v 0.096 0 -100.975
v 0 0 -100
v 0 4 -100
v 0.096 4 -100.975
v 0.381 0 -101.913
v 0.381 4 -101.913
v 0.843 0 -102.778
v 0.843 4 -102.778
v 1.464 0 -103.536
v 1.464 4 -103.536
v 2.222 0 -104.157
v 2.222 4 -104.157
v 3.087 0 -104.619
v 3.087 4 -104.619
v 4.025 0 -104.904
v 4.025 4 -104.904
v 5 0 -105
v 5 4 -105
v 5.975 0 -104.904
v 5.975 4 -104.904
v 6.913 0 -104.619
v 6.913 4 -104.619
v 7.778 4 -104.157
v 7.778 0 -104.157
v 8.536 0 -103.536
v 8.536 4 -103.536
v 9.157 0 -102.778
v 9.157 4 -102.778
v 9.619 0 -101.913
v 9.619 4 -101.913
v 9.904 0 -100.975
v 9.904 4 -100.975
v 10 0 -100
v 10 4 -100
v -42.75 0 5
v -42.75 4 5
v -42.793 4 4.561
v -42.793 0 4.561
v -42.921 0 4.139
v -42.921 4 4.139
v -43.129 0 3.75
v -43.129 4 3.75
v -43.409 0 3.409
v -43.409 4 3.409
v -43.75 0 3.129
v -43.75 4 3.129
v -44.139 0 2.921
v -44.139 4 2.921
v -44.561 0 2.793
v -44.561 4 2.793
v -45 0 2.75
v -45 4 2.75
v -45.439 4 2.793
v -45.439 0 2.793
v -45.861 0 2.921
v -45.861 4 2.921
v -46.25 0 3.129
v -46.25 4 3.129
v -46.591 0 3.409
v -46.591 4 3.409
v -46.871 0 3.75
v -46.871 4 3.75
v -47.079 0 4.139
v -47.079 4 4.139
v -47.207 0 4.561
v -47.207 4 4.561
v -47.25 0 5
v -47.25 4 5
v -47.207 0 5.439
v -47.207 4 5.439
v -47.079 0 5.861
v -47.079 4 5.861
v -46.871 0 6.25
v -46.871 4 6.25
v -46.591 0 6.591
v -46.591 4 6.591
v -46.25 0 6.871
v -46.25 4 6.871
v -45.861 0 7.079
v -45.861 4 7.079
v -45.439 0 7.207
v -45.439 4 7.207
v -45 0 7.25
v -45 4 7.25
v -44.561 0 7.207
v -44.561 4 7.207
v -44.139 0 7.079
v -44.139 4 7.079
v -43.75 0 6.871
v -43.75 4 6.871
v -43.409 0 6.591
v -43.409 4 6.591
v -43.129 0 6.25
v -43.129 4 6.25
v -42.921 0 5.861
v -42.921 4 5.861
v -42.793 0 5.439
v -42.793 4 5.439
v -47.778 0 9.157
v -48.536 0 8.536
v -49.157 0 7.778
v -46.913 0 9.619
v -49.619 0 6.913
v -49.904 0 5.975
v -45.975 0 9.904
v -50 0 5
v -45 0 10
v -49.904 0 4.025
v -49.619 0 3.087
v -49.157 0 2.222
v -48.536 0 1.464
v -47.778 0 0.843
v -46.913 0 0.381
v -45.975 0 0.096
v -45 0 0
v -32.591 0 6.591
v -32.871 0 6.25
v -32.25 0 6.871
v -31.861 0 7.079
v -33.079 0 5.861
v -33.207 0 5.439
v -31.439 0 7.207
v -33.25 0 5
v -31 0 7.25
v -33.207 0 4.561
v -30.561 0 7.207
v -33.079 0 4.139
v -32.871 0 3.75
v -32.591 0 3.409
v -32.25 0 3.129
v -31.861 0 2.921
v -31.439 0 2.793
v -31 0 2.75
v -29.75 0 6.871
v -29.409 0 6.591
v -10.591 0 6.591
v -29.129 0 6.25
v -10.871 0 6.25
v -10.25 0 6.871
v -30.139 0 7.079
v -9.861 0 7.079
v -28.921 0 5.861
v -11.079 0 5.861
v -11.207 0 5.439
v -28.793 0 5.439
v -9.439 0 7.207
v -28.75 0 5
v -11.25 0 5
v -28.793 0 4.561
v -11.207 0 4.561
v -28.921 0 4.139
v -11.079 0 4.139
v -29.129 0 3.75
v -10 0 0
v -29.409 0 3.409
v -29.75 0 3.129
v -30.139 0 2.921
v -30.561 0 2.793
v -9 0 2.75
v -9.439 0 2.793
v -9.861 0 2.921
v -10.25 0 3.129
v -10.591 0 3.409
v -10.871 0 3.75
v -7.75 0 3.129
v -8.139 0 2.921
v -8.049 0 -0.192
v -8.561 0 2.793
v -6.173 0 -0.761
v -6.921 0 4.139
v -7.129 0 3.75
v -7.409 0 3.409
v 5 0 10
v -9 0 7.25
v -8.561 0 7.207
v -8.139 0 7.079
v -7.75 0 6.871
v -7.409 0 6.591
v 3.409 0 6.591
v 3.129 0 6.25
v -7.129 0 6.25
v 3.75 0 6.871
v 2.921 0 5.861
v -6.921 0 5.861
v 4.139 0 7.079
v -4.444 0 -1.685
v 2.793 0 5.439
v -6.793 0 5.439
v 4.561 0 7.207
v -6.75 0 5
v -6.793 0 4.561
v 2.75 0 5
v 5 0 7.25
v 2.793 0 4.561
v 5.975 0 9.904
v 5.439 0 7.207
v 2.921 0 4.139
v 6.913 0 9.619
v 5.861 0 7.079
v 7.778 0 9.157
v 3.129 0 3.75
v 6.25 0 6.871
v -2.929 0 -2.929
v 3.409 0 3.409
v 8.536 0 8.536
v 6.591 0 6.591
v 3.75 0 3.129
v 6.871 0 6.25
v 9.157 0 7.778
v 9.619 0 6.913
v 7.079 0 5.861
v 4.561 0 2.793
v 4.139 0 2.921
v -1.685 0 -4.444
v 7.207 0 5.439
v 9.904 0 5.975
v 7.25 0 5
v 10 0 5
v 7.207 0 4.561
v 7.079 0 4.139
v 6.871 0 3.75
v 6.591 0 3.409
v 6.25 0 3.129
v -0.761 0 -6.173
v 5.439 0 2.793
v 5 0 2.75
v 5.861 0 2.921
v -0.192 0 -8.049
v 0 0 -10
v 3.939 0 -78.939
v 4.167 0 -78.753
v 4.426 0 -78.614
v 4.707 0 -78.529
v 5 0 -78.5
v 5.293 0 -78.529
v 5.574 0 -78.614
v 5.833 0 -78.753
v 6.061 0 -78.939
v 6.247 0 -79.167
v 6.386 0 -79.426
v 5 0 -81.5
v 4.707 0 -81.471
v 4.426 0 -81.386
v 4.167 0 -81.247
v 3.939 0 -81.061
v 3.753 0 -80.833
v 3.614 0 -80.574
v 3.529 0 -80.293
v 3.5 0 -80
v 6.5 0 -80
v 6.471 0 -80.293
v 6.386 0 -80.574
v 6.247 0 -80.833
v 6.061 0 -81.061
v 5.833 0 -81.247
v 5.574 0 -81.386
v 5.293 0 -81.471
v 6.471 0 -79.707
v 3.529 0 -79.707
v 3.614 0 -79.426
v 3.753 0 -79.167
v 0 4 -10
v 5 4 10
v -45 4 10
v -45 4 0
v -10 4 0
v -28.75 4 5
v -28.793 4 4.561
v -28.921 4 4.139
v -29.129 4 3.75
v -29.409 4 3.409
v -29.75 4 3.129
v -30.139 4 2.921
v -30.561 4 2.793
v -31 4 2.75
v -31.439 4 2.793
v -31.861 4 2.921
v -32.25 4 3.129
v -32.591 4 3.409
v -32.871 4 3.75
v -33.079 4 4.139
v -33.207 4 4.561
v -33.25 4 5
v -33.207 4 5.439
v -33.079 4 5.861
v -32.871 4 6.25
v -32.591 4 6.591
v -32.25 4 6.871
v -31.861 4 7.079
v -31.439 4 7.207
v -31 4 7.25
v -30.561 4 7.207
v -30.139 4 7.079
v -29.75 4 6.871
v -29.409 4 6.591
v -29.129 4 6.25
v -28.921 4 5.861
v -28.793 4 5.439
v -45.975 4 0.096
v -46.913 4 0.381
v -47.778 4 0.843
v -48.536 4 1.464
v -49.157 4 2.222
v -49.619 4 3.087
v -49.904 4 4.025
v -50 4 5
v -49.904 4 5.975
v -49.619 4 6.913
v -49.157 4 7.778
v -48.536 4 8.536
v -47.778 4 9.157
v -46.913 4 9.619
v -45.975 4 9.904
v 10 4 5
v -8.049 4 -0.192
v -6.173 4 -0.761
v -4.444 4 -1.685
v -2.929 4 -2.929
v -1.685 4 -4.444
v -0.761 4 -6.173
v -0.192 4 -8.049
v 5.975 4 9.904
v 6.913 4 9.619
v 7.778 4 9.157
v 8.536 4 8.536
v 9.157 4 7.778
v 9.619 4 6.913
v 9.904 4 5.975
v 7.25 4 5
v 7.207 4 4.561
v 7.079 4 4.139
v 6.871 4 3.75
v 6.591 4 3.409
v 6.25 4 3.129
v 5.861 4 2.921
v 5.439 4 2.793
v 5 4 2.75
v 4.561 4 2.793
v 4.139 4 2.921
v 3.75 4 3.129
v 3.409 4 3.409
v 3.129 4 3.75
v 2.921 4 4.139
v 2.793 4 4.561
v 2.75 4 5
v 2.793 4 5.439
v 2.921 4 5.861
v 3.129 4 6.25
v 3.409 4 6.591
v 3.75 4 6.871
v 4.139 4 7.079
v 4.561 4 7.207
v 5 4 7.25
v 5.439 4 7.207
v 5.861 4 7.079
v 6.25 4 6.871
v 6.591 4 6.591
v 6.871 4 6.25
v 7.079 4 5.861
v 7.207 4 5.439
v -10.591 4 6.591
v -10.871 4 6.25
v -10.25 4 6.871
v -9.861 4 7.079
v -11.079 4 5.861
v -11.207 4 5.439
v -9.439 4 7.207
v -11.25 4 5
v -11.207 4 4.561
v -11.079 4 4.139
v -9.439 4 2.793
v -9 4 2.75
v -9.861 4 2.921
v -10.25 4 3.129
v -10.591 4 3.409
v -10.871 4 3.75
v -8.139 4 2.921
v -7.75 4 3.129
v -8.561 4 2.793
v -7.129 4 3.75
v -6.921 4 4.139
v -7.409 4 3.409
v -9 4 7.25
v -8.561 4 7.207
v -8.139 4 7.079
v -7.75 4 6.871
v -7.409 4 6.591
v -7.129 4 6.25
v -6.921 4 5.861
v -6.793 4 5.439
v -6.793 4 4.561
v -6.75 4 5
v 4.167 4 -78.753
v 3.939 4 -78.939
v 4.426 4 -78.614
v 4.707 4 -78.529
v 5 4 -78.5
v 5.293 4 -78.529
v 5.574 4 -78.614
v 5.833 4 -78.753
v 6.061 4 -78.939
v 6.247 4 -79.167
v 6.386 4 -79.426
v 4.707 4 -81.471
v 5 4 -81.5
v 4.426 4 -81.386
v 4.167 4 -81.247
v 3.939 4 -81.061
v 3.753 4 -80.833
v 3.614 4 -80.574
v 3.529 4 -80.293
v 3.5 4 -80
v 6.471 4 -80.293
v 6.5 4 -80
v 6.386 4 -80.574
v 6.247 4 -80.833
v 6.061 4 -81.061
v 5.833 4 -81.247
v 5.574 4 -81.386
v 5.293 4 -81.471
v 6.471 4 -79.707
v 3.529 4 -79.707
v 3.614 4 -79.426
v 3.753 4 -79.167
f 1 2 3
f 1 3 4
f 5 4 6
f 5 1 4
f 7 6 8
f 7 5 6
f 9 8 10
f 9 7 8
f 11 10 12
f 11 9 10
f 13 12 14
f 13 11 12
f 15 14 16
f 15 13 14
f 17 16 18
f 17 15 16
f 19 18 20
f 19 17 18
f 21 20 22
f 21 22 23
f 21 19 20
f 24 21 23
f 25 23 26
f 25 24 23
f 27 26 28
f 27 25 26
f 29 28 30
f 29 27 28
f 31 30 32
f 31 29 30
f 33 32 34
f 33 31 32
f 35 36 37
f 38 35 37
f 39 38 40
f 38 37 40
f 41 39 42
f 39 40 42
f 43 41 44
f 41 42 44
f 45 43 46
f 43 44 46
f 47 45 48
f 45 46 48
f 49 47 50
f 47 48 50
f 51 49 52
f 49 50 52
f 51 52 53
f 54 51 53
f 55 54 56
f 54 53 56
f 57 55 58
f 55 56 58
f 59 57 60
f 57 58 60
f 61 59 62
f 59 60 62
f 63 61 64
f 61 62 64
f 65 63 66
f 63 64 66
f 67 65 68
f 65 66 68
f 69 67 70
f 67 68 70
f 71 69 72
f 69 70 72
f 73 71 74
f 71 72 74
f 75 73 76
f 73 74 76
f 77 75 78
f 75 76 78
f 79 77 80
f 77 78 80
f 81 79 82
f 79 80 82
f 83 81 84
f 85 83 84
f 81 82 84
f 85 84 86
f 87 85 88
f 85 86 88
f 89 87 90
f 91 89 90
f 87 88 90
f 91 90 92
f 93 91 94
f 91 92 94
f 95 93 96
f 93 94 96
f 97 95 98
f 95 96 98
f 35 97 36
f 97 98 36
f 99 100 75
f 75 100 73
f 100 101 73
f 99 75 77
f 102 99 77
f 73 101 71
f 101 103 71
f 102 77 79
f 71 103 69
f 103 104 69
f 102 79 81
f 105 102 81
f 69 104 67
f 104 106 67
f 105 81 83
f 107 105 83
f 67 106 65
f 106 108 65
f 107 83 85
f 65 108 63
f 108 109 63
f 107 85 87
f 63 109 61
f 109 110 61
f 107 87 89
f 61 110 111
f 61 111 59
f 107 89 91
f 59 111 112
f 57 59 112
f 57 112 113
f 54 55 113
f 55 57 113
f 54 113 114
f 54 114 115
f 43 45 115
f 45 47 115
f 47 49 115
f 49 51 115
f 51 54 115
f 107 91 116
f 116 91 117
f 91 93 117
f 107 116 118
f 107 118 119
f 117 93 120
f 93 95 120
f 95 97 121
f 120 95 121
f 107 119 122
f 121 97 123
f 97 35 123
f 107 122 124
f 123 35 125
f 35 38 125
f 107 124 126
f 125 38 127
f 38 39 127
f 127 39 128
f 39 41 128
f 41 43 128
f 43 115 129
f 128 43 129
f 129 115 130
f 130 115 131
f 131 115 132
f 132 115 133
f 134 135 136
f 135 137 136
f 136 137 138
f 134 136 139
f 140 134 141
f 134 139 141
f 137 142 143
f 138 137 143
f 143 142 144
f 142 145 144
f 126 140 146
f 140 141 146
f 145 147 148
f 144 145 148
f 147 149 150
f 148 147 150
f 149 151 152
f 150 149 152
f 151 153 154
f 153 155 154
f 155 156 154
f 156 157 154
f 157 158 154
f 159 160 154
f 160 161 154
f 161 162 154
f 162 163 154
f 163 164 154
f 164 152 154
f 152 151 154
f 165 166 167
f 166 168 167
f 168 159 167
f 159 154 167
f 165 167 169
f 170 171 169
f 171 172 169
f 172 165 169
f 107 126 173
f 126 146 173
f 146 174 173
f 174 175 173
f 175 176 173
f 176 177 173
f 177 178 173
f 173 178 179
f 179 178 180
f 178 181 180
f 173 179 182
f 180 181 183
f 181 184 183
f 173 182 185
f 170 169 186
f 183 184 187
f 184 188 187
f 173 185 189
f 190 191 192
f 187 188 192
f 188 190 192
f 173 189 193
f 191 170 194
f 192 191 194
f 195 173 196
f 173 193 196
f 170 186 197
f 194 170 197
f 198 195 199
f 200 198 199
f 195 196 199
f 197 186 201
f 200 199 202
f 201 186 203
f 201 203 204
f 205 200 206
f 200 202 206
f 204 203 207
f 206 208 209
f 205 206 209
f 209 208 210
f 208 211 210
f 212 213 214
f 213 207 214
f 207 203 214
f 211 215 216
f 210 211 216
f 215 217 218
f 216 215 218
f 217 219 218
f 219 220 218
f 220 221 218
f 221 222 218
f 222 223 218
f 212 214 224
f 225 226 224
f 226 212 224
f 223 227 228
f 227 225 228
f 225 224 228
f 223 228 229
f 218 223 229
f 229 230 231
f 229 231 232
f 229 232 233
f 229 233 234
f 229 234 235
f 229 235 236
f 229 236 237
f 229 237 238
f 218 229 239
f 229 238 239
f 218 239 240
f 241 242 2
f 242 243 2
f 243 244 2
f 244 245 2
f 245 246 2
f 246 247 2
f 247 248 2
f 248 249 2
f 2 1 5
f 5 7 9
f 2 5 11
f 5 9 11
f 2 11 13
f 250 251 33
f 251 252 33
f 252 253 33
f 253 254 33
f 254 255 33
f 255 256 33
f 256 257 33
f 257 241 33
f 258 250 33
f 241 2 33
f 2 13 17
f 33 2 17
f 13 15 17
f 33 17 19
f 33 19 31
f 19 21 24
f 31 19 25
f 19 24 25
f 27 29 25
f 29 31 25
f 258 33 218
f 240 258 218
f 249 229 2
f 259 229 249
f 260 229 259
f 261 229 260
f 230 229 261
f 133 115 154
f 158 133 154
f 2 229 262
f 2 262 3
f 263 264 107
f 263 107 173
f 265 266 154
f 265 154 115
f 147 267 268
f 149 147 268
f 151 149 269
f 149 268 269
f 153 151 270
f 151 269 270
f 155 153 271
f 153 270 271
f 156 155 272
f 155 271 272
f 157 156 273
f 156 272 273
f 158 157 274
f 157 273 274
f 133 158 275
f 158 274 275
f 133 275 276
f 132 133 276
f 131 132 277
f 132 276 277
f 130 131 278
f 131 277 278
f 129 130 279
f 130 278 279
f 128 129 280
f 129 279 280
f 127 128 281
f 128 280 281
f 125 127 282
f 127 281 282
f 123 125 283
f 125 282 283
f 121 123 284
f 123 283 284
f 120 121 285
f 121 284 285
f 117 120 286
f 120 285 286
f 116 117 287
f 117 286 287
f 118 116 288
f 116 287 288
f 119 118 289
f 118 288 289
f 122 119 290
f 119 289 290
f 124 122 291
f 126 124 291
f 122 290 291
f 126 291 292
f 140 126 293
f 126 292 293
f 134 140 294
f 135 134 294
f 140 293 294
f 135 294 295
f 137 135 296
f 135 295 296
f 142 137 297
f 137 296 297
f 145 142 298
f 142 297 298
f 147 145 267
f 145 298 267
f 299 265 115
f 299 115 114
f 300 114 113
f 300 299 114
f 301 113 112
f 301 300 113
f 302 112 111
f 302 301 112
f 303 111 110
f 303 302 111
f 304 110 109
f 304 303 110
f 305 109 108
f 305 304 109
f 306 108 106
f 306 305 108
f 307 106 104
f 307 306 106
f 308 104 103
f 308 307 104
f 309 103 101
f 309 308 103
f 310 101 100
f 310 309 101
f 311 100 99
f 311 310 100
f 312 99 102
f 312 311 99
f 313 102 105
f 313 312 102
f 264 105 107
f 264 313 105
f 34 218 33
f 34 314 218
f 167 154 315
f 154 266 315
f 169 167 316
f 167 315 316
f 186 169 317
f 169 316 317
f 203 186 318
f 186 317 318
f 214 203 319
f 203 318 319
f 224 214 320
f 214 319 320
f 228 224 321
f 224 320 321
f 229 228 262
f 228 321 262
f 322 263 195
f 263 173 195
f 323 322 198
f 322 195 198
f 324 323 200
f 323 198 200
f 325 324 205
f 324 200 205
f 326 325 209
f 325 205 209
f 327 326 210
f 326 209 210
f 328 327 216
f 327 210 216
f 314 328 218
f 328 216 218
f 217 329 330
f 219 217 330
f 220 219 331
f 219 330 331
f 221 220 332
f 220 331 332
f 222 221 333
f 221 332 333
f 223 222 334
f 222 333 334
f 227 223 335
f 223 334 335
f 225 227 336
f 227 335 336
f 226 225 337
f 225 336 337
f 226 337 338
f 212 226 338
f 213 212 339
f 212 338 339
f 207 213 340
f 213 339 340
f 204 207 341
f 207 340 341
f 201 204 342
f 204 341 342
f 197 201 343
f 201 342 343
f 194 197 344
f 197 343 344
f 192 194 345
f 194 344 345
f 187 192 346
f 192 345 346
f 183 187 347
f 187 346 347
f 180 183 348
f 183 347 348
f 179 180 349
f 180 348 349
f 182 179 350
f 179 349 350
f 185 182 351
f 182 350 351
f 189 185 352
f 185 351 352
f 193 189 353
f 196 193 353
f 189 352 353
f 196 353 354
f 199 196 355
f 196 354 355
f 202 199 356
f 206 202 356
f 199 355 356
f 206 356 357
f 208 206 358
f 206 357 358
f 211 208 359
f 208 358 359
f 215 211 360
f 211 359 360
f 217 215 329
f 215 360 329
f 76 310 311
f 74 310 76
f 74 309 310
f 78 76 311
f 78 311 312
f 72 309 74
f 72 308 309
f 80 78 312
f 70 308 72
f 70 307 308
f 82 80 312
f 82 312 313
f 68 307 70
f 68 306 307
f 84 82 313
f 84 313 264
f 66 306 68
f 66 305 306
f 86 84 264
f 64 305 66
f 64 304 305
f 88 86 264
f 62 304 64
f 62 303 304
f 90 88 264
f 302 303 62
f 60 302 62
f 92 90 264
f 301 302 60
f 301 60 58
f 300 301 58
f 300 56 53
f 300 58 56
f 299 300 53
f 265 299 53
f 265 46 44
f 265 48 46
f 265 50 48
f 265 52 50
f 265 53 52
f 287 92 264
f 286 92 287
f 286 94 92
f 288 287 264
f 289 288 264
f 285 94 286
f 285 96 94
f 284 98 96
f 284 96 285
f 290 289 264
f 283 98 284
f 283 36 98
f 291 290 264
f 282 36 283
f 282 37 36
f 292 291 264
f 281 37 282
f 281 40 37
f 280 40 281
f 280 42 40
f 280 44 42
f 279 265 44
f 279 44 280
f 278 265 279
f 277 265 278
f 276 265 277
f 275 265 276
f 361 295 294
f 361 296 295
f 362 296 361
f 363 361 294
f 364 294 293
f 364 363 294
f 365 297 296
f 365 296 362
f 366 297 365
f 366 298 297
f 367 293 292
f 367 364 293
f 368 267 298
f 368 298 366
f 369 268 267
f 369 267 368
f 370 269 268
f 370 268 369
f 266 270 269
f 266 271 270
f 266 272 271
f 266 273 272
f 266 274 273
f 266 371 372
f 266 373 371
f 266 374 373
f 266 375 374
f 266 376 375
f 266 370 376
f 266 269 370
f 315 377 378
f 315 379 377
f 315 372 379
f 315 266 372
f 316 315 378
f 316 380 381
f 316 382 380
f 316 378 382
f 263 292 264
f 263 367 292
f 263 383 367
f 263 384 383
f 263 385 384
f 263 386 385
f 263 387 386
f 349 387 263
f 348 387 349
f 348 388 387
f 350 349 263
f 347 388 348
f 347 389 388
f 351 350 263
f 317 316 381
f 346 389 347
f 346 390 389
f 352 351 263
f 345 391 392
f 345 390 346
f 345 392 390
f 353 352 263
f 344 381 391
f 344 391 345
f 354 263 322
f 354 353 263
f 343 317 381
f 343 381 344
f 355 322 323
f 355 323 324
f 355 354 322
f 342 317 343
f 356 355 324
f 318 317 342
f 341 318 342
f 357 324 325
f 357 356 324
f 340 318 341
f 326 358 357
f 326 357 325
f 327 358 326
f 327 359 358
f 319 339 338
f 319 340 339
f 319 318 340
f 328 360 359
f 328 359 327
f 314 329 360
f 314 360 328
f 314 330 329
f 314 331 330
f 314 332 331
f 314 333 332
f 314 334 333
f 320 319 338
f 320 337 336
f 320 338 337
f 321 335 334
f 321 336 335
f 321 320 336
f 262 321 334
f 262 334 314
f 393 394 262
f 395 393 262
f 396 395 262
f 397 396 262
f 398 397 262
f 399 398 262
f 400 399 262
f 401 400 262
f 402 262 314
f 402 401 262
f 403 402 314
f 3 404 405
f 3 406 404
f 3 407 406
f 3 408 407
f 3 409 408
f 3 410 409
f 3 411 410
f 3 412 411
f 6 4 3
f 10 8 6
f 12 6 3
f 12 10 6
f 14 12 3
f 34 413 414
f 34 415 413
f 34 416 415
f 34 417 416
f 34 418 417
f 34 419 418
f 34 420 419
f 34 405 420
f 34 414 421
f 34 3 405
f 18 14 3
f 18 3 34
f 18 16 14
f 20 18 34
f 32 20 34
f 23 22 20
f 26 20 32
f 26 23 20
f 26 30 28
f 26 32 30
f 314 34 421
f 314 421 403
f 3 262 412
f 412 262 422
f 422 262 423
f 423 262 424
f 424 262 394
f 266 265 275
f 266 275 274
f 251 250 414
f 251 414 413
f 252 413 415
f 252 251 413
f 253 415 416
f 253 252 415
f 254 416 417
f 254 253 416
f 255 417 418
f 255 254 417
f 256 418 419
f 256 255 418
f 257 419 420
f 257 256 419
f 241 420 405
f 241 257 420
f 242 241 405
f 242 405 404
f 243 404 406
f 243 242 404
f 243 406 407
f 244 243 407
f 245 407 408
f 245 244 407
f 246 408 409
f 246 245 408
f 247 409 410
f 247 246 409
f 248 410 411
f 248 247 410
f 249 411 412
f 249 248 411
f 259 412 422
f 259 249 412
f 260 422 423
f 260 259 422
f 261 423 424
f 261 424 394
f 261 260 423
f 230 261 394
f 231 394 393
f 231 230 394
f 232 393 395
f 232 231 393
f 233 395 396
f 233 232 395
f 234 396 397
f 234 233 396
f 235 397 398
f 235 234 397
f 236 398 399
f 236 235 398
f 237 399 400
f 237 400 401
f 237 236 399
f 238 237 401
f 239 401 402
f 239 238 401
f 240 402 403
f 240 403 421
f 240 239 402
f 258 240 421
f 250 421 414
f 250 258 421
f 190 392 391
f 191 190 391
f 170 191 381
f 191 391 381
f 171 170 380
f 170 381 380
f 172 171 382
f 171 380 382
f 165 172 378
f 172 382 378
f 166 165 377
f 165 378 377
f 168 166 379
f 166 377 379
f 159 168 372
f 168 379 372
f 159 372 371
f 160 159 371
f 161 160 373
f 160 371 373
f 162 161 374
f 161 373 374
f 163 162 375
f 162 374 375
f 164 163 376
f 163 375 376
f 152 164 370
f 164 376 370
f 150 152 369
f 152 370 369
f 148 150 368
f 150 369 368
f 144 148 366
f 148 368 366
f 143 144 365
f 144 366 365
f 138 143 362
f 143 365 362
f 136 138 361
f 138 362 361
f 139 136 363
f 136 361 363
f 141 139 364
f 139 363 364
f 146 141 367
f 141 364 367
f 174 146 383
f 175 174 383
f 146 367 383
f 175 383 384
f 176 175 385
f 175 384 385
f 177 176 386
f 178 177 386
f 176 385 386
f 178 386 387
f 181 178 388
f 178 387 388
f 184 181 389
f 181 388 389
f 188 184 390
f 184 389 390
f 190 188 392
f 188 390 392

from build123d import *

# Parameters (mm, degrees)
SKETCH1_R           = 1.5
BOSS_EXTRUDE1_DEPTH = 4
SKETCH2_R           = 2.25
BOSS_EXTRUDE2_DEPTH = 4
FILLET1_R           = 10
FILLET2_R           = 5


with BuildPart() as part:
    # Sketch1 → Boss-Extrude1 (new body)
    with BuildSketch(Plane(origin=(0, 0, 0), x_dir=(1, 0, 0), z_dir=(0, 1, 0))):
        with BuildLine():
            Line((0, 0), (0, 100))
            ThreePointArc((0, 100), (5, 105), (10, 100))
            Line((10, 100), (10, 0))
            Line((10, 0), (0, 0))
        make_face()
        with Locations((5, 80)):
            Circle(SKETCH1_R, mode=Mode.SUBTRACT)
    extrude(amount=BOSS_EXTRUDE1_DEPTH)

    # Sketch2 → Boss-Extrude2 (add)
    with BuildSketch(Plane(origin=(0, 4, 0), x_dir=(1, 0, 0), z_dir=(0, 1, 0))):
        with BuildLine():
            Line((10, 0), (0, 0))
            Line((0, 0), (-45, 0))
            ThreePointArc((-45, 0), (-50, -5), (-45, -10))
            Line((-45, -10), (10, -10))
            Line((10, -10), (10, 0))
        make_face()
        with Locations((-45, -5)):
            Circle(SKETCH2_R, mode=Mode.SUBTRACT)
        with Locations((-31, -5)):
            Circle(SKETCH2_R, mode=Mode.SUBTRACT)
        with Locations((-9, -5)):
            Circle(SKETCH2_R, mode=Mode.SUBTRACT)
        with Locations((5, -5)):
            Circle(SKETCH2_R, mode=Mode.SUBTRACT)
    extrude(amount=-BOSS_EXTRUDE2_DEPTH)

    # Fillet1
    fillet1_edges = [part.edges().sort_by_distance(p)[0] for p in [
        (0, 2, 0),
    ]]
    fillet(fillet1_edges, radius=FILLET1_R)

    # Fillet2
    fillet2_edges = [part.edges().sort_by_distance(p)[0] for p in [
        (10, 2, 10),
    ]]
    fillet(fillet2_edges, radius=FILLET2_R)


solid = part.part
